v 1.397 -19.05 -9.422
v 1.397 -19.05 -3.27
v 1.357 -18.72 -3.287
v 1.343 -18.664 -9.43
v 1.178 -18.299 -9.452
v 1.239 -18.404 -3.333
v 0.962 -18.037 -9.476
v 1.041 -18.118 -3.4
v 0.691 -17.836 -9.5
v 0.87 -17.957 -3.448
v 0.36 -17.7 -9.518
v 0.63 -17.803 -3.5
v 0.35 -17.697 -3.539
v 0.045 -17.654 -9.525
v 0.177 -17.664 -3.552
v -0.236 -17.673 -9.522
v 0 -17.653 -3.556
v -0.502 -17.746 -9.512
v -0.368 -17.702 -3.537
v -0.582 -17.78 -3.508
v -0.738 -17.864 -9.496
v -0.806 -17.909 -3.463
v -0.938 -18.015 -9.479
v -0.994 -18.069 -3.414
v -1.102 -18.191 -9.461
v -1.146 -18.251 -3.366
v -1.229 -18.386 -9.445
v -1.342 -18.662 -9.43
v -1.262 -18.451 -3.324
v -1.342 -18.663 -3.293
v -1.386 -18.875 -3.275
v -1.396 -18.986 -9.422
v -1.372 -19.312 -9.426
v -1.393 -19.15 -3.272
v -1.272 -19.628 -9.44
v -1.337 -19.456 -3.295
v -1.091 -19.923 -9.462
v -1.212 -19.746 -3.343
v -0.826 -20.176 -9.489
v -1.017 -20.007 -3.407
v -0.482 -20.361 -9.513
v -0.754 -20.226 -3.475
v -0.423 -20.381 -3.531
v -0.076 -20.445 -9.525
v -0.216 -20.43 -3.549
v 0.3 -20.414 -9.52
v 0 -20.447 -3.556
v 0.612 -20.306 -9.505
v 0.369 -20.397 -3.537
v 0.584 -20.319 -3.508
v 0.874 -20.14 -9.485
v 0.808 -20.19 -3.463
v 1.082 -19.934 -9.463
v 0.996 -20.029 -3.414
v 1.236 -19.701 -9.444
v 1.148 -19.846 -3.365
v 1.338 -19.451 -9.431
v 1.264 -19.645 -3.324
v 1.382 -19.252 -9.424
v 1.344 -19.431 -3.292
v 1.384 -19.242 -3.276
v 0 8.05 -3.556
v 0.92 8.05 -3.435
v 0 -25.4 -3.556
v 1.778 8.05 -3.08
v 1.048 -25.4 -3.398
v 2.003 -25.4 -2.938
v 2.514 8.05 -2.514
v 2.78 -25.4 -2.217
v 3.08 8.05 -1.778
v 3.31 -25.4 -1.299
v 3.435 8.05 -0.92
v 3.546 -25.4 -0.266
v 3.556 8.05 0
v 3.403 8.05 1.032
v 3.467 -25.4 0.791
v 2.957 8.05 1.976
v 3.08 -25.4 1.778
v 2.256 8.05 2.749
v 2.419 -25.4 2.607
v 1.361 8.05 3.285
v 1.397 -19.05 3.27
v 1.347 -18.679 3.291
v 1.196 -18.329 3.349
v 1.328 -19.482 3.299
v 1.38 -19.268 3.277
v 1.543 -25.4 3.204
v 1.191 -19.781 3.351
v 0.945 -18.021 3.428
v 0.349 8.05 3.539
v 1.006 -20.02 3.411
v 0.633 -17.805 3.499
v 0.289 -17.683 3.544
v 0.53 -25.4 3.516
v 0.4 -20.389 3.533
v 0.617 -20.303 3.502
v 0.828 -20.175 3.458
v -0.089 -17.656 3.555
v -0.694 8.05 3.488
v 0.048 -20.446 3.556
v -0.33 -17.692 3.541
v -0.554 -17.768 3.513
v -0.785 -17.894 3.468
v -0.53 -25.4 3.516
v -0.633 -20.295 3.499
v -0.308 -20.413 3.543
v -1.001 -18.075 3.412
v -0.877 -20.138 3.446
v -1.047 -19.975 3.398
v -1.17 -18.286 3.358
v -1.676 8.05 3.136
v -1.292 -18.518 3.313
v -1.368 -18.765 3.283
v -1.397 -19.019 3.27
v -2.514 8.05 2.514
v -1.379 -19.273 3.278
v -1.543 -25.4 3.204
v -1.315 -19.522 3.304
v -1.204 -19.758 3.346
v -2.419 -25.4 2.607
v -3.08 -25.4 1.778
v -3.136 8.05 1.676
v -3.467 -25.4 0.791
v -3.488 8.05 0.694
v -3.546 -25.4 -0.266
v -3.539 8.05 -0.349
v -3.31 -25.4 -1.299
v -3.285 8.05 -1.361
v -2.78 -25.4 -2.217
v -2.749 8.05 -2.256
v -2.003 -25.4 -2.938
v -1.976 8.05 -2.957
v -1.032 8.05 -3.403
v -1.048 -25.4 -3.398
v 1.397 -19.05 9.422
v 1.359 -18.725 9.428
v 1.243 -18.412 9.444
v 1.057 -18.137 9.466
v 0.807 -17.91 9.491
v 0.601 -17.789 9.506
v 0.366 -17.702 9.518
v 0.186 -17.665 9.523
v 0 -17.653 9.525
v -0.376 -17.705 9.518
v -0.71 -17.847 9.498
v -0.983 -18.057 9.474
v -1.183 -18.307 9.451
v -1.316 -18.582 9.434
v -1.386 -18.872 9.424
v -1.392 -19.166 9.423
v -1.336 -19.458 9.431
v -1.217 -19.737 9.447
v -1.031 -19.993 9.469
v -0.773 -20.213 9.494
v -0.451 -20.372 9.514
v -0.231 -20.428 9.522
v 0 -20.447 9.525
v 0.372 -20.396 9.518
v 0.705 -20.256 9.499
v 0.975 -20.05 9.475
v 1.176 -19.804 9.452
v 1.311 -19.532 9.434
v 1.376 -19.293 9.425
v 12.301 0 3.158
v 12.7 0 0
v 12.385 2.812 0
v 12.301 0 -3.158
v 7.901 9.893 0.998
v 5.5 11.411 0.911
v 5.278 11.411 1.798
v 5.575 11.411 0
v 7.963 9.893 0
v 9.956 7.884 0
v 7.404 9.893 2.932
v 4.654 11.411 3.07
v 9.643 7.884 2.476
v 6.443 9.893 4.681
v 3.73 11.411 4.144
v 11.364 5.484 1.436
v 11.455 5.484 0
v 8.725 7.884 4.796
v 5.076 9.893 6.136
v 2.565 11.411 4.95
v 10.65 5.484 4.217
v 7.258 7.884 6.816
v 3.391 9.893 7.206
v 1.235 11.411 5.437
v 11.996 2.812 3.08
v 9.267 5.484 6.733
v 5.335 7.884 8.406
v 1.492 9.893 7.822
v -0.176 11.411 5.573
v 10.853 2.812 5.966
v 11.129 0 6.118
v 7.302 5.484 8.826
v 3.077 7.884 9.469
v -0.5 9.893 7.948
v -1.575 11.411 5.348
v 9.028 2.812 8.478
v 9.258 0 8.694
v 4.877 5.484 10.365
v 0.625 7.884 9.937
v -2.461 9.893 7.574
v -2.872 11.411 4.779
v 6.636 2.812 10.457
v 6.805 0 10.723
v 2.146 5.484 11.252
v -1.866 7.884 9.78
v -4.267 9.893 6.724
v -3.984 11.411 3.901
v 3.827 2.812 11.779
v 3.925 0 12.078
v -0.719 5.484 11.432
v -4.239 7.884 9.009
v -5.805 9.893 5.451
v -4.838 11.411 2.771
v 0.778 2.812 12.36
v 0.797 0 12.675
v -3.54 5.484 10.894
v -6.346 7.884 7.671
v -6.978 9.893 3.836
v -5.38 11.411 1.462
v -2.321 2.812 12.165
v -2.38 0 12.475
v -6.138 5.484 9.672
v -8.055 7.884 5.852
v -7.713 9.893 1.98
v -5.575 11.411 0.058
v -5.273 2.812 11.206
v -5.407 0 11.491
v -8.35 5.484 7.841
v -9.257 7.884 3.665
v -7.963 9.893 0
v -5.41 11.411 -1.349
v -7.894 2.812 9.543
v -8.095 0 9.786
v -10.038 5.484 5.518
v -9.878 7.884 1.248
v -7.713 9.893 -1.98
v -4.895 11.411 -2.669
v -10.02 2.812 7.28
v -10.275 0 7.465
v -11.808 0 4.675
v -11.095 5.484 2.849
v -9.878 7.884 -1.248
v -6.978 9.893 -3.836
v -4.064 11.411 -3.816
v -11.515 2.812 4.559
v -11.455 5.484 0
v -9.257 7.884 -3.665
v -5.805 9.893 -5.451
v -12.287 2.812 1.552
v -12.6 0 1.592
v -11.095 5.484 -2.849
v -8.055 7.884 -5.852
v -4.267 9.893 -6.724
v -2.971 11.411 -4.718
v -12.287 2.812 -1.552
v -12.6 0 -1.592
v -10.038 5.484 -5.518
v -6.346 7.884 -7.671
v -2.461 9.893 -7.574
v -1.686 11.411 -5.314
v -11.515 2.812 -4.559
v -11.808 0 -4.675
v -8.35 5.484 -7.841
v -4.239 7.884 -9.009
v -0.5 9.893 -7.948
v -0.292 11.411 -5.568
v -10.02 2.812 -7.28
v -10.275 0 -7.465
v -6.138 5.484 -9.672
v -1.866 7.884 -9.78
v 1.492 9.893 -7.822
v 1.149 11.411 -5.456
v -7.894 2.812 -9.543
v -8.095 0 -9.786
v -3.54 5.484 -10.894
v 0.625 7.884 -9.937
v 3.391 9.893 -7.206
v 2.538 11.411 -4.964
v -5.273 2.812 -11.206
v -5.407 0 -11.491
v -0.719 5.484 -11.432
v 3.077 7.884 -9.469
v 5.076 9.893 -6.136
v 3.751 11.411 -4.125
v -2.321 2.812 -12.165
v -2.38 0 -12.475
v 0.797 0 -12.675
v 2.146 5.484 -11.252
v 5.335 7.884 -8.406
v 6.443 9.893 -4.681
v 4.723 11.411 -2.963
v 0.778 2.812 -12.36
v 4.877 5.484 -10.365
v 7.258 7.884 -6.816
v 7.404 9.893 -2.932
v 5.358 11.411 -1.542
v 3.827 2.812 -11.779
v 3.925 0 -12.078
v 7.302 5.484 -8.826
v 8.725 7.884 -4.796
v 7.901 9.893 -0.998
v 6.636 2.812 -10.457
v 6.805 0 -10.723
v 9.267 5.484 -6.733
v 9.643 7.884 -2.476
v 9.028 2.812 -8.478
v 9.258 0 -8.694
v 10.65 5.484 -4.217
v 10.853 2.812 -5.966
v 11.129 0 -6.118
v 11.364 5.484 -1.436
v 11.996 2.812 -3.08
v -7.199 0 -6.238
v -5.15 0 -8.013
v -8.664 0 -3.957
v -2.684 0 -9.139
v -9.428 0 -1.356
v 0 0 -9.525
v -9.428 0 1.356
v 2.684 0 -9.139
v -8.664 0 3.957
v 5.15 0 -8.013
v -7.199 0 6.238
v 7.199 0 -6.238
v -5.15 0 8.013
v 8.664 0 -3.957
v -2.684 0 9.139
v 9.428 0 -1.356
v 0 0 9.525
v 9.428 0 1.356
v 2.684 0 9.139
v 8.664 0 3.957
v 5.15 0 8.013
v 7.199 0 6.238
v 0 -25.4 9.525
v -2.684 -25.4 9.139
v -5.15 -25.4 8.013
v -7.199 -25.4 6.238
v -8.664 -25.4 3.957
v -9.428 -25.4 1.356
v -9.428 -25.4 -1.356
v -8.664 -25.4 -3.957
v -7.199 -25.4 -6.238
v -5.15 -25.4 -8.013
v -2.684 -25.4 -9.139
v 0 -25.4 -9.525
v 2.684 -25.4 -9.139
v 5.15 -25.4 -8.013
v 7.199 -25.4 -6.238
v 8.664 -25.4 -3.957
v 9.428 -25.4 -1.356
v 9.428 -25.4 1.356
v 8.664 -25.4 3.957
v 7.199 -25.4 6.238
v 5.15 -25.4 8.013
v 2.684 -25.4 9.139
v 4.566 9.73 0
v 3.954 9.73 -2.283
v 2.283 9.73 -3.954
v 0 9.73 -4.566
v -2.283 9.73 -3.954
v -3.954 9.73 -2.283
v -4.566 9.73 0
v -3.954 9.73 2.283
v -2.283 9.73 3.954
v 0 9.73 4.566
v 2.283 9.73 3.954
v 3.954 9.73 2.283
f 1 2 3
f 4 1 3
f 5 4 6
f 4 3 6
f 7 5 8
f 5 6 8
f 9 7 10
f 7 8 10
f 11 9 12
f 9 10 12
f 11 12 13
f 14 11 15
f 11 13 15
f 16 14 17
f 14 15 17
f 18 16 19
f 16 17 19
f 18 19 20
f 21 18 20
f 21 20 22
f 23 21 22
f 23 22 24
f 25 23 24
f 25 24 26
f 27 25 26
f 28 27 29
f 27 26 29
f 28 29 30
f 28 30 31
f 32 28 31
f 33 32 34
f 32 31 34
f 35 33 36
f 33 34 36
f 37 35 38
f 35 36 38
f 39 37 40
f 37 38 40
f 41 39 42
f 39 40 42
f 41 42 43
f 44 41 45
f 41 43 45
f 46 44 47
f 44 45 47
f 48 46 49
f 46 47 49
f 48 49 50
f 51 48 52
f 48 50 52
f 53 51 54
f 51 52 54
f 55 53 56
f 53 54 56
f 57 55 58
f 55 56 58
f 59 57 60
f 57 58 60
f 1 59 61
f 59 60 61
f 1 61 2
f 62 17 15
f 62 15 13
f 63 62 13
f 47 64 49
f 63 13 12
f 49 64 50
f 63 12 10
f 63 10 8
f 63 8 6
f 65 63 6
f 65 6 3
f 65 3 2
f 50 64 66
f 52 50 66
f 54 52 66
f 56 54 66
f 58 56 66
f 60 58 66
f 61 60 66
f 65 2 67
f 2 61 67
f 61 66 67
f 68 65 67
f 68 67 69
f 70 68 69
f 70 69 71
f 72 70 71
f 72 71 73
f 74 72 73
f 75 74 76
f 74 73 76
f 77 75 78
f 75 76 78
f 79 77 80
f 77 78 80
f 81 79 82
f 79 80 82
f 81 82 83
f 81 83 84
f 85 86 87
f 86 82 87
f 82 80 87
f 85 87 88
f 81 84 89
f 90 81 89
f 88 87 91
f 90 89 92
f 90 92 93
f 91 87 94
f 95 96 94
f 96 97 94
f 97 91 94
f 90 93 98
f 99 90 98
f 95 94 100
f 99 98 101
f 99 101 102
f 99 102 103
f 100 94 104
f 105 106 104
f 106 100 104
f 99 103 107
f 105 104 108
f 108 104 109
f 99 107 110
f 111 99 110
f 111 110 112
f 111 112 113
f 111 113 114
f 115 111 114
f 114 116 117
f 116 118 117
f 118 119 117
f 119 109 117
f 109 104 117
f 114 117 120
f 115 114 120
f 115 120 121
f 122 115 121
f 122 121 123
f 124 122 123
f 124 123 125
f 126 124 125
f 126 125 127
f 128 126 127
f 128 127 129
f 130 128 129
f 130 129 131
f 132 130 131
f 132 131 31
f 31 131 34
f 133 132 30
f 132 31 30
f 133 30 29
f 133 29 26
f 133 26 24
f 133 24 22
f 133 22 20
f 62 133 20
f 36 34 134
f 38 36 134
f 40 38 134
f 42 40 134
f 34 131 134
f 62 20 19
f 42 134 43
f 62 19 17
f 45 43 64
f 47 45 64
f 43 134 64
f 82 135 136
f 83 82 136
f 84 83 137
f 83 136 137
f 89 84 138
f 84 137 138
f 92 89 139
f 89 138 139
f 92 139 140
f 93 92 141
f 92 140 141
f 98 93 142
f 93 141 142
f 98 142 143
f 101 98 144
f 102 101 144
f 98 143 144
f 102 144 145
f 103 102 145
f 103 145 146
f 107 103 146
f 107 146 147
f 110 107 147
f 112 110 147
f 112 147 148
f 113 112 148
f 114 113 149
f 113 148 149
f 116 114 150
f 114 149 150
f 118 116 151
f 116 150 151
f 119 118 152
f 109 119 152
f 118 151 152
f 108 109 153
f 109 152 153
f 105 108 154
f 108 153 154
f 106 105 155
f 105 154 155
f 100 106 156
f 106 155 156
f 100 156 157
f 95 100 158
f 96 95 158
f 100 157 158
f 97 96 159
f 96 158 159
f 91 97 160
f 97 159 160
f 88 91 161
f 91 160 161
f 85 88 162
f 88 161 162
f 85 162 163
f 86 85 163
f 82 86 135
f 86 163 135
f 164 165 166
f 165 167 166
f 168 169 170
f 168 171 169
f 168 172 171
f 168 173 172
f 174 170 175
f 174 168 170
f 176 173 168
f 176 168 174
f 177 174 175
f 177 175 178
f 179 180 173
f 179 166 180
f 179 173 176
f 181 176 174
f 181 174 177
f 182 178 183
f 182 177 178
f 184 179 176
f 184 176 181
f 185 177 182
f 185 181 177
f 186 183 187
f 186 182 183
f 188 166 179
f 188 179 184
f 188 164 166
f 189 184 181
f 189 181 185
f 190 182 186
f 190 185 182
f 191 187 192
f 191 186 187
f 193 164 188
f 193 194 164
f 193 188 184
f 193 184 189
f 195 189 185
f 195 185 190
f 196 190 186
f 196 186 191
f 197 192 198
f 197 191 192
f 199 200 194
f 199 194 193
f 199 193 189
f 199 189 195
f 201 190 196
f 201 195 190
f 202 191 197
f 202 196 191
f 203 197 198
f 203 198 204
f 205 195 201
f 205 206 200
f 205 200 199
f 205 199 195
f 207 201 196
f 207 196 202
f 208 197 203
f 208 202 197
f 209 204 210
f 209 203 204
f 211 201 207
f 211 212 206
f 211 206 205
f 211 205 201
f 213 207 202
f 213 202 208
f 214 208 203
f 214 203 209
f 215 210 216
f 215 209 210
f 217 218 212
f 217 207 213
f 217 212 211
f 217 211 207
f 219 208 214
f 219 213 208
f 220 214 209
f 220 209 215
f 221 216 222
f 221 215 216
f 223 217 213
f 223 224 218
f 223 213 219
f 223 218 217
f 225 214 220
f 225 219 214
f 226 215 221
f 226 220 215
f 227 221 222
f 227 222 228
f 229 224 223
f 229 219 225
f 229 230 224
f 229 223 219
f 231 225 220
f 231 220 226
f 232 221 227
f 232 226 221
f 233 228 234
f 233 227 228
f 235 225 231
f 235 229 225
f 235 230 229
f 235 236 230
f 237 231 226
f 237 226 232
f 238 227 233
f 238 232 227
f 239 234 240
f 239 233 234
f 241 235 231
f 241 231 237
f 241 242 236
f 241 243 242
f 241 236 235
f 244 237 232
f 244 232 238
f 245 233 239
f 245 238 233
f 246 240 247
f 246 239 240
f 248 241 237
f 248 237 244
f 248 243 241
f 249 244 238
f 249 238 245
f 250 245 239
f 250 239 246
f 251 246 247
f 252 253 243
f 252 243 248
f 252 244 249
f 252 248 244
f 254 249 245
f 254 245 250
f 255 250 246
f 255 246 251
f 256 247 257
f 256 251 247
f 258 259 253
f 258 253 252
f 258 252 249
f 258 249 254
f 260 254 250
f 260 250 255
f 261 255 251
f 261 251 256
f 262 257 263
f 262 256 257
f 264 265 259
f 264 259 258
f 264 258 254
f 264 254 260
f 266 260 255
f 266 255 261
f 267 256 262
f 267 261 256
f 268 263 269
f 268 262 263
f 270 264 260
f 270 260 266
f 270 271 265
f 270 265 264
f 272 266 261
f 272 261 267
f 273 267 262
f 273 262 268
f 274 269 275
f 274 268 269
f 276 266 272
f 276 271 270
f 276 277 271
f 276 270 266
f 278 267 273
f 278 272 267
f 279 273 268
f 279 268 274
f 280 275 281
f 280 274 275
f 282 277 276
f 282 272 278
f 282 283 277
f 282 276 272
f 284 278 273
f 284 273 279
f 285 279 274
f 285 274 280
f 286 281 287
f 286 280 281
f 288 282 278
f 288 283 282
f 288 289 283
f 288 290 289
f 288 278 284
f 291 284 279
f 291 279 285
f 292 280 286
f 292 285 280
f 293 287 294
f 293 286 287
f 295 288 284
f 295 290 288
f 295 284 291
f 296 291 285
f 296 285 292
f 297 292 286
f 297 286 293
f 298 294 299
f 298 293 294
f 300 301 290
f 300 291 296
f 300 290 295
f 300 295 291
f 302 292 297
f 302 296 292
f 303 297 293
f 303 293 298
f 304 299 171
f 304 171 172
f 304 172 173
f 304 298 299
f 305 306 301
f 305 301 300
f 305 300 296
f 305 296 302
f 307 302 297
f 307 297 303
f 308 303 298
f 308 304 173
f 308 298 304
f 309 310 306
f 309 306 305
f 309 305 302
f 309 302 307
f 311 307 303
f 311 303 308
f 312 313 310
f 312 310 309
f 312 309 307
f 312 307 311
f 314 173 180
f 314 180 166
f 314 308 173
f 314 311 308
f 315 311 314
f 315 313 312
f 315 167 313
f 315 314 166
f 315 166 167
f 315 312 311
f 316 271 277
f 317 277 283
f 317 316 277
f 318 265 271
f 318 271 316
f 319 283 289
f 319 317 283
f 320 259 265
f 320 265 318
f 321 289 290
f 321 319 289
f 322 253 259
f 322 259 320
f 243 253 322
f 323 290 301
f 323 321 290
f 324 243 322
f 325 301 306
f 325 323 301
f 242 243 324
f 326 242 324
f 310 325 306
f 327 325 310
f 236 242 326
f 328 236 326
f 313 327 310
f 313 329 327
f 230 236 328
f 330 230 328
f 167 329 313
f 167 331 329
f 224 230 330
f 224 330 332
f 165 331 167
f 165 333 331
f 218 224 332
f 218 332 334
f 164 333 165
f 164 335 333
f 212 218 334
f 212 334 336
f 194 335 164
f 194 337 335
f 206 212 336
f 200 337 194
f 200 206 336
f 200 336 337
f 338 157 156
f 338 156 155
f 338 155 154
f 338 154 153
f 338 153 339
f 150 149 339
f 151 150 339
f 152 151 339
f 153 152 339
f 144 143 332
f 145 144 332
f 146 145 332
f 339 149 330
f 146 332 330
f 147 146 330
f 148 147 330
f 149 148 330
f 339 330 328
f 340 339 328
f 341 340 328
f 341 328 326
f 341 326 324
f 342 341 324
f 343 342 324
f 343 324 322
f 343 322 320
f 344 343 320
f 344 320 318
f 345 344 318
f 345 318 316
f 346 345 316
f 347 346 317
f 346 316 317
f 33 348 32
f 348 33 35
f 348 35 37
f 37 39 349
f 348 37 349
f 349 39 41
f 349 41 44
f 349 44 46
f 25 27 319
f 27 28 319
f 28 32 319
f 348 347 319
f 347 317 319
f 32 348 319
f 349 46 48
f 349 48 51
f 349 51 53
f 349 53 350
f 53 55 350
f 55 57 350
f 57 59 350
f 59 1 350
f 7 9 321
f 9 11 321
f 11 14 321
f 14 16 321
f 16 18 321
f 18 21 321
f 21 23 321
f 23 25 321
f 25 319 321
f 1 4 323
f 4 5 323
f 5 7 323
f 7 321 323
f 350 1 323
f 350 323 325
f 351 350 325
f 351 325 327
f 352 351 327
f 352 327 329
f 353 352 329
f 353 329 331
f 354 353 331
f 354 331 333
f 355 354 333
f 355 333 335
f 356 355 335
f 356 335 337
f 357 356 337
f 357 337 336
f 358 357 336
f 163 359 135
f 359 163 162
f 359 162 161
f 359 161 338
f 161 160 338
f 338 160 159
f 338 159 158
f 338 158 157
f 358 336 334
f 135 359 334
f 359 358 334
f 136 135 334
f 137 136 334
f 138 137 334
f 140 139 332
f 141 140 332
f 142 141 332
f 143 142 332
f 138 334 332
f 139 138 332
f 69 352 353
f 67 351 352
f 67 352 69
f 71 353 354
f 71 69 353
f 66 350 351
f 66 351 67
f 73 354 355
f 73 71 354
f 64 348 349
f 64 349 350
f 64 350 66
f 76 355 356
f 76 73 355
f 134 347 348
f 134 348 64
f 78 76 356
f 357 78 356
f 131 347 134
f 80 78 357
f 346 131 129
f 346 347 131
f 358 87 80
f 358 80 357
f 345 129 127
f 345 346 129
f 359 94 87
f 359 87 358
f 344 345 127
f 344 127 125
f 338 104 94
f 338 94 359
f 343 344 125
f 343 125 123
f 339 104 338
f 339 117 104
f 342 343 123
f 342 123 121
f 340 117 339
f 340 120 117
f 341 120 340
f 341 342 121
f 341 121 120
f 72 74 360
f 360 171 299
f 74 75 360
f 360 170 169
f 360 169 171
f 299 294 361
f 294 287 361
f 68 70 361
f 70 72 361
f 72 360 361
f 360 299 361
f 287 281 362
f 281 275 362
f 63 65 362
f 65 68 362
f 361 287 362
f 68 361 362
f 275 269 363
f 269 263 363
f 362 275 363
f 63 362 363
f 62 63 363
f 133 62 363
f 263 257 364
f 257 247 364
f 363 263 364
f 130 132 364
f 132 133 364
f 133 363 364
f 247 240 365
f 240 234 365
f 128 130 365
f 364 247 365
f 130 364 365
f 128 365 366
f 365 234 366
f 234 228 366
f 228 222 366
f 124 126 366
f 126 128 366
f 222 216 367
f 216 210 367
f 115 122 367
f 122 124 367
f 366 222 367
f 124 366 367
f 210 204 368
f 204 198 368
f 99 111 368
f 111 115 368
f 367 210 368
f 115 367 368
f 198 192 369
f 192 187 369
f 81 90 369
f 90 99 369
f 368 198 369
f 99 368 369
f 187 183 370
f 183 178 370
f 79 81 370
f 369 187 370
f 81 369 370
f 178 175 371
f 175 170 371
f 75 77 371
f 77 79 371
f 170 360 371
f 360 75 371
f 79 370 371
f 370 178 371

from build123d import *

# Parameters (mm, degrees)
SKETCH3_R           = 9.525
BOSS_EXTRUDE1_DEPTH = 25.4
SKETCH5_R           = 3.556
CUT_EXTRUDE1_DEPTH  = 43.121134838
SKETCH6_R           = 6.35
CUT_EXTRUDE2_DEPTH  = 5.08
CUT_EXTRUDE2_DRAFT  = -31
SKETCH7_R           = 1.397
CUT_EXTRUDE3_DEPTH  = 39.1


with BuildPart() as part:
    # Sketch2 → Revolve2 (revolve)
    with BuildSketch(Plane.XY):
        with BuildLine():
            Line((12.7, 0), (0, 0))
            Line((0, 0), (0, 12.7))
            ThreePointArc((0, 12.7), (8.980256121, 8.980256121), (12.7, 0))
        make_face()
    revolve(axis=Axis((0, 67.537553081, 0), (0, -1, 0)))

    # Sketch3 → Boss-Extrude1 (add)
    with BuildSketch(Plane.XZ):
        with Locations(Location((0, 0, 0), (0, 0, 90))):
            Circle(SKETCH3_R)
    extrude(amount=BOSS_EXTRUDE1_DEPTH)

    # Sketch5 → Cut-Extrude1 (cut, through all)
    with BuildSketch(Plane.XZ.offset(25.4)):
        with Locations(Location((0, 0, 0), (0, 0, 270))):
            Circle(SKETCH5_R)
    extrude(amount=-CUT_EXTRUDE1_DEPTH, mode=Mode.SUBTRACT)


with BuildPart() as cut_extrude2_tool:
    # Sketch6 → Cut-Extrude2 (with draft: the straight prism first)
    with BuildSketch(Plane(origin=(0, 12.7, 0), x_dir=(1, 0, 0), z_dir=(0, 1, 0))):
        Circle(SKETCH6_R)
    extrude(amount=-CUT_EXTRUDE2_DEPTH)
    # Cut-Extrude2: the draft: its side faces are tilted about the plane it starts from
    cut_extrude2_sides = [cut_extrude2_tool.faces().sort_by_distance(p)[0] for p in [
        (-6.35, 10.16, 0),
    ]]
    draft(cut_extrude2_sides, Plane(origin=(0, 12.7, 0), x_dir=(1, 0, 0), z_dir=(0, 1, 0)), CUT_EXTRUDE2_DRAFT)


with BuildPart() as part_1:
    add(part.part)

    # Cut-Extrude2: cut by cut_extrude2_tool
    add(cut_extrude2_tool.part, mode=Mode.SUBTRACT)

    # Sketch7 → Cut-Extrude3 (cut, through all)
    with BuildSketch(Plane.XY.offset(12.7)):
        with Locations((0, -19.05)):
            Circle(SKETCH7_R)
    extrude(amount=-CUT_EXTRUDE3_DEPTH, mode=Mode.SUBTRACT)


solid = part_1.part
